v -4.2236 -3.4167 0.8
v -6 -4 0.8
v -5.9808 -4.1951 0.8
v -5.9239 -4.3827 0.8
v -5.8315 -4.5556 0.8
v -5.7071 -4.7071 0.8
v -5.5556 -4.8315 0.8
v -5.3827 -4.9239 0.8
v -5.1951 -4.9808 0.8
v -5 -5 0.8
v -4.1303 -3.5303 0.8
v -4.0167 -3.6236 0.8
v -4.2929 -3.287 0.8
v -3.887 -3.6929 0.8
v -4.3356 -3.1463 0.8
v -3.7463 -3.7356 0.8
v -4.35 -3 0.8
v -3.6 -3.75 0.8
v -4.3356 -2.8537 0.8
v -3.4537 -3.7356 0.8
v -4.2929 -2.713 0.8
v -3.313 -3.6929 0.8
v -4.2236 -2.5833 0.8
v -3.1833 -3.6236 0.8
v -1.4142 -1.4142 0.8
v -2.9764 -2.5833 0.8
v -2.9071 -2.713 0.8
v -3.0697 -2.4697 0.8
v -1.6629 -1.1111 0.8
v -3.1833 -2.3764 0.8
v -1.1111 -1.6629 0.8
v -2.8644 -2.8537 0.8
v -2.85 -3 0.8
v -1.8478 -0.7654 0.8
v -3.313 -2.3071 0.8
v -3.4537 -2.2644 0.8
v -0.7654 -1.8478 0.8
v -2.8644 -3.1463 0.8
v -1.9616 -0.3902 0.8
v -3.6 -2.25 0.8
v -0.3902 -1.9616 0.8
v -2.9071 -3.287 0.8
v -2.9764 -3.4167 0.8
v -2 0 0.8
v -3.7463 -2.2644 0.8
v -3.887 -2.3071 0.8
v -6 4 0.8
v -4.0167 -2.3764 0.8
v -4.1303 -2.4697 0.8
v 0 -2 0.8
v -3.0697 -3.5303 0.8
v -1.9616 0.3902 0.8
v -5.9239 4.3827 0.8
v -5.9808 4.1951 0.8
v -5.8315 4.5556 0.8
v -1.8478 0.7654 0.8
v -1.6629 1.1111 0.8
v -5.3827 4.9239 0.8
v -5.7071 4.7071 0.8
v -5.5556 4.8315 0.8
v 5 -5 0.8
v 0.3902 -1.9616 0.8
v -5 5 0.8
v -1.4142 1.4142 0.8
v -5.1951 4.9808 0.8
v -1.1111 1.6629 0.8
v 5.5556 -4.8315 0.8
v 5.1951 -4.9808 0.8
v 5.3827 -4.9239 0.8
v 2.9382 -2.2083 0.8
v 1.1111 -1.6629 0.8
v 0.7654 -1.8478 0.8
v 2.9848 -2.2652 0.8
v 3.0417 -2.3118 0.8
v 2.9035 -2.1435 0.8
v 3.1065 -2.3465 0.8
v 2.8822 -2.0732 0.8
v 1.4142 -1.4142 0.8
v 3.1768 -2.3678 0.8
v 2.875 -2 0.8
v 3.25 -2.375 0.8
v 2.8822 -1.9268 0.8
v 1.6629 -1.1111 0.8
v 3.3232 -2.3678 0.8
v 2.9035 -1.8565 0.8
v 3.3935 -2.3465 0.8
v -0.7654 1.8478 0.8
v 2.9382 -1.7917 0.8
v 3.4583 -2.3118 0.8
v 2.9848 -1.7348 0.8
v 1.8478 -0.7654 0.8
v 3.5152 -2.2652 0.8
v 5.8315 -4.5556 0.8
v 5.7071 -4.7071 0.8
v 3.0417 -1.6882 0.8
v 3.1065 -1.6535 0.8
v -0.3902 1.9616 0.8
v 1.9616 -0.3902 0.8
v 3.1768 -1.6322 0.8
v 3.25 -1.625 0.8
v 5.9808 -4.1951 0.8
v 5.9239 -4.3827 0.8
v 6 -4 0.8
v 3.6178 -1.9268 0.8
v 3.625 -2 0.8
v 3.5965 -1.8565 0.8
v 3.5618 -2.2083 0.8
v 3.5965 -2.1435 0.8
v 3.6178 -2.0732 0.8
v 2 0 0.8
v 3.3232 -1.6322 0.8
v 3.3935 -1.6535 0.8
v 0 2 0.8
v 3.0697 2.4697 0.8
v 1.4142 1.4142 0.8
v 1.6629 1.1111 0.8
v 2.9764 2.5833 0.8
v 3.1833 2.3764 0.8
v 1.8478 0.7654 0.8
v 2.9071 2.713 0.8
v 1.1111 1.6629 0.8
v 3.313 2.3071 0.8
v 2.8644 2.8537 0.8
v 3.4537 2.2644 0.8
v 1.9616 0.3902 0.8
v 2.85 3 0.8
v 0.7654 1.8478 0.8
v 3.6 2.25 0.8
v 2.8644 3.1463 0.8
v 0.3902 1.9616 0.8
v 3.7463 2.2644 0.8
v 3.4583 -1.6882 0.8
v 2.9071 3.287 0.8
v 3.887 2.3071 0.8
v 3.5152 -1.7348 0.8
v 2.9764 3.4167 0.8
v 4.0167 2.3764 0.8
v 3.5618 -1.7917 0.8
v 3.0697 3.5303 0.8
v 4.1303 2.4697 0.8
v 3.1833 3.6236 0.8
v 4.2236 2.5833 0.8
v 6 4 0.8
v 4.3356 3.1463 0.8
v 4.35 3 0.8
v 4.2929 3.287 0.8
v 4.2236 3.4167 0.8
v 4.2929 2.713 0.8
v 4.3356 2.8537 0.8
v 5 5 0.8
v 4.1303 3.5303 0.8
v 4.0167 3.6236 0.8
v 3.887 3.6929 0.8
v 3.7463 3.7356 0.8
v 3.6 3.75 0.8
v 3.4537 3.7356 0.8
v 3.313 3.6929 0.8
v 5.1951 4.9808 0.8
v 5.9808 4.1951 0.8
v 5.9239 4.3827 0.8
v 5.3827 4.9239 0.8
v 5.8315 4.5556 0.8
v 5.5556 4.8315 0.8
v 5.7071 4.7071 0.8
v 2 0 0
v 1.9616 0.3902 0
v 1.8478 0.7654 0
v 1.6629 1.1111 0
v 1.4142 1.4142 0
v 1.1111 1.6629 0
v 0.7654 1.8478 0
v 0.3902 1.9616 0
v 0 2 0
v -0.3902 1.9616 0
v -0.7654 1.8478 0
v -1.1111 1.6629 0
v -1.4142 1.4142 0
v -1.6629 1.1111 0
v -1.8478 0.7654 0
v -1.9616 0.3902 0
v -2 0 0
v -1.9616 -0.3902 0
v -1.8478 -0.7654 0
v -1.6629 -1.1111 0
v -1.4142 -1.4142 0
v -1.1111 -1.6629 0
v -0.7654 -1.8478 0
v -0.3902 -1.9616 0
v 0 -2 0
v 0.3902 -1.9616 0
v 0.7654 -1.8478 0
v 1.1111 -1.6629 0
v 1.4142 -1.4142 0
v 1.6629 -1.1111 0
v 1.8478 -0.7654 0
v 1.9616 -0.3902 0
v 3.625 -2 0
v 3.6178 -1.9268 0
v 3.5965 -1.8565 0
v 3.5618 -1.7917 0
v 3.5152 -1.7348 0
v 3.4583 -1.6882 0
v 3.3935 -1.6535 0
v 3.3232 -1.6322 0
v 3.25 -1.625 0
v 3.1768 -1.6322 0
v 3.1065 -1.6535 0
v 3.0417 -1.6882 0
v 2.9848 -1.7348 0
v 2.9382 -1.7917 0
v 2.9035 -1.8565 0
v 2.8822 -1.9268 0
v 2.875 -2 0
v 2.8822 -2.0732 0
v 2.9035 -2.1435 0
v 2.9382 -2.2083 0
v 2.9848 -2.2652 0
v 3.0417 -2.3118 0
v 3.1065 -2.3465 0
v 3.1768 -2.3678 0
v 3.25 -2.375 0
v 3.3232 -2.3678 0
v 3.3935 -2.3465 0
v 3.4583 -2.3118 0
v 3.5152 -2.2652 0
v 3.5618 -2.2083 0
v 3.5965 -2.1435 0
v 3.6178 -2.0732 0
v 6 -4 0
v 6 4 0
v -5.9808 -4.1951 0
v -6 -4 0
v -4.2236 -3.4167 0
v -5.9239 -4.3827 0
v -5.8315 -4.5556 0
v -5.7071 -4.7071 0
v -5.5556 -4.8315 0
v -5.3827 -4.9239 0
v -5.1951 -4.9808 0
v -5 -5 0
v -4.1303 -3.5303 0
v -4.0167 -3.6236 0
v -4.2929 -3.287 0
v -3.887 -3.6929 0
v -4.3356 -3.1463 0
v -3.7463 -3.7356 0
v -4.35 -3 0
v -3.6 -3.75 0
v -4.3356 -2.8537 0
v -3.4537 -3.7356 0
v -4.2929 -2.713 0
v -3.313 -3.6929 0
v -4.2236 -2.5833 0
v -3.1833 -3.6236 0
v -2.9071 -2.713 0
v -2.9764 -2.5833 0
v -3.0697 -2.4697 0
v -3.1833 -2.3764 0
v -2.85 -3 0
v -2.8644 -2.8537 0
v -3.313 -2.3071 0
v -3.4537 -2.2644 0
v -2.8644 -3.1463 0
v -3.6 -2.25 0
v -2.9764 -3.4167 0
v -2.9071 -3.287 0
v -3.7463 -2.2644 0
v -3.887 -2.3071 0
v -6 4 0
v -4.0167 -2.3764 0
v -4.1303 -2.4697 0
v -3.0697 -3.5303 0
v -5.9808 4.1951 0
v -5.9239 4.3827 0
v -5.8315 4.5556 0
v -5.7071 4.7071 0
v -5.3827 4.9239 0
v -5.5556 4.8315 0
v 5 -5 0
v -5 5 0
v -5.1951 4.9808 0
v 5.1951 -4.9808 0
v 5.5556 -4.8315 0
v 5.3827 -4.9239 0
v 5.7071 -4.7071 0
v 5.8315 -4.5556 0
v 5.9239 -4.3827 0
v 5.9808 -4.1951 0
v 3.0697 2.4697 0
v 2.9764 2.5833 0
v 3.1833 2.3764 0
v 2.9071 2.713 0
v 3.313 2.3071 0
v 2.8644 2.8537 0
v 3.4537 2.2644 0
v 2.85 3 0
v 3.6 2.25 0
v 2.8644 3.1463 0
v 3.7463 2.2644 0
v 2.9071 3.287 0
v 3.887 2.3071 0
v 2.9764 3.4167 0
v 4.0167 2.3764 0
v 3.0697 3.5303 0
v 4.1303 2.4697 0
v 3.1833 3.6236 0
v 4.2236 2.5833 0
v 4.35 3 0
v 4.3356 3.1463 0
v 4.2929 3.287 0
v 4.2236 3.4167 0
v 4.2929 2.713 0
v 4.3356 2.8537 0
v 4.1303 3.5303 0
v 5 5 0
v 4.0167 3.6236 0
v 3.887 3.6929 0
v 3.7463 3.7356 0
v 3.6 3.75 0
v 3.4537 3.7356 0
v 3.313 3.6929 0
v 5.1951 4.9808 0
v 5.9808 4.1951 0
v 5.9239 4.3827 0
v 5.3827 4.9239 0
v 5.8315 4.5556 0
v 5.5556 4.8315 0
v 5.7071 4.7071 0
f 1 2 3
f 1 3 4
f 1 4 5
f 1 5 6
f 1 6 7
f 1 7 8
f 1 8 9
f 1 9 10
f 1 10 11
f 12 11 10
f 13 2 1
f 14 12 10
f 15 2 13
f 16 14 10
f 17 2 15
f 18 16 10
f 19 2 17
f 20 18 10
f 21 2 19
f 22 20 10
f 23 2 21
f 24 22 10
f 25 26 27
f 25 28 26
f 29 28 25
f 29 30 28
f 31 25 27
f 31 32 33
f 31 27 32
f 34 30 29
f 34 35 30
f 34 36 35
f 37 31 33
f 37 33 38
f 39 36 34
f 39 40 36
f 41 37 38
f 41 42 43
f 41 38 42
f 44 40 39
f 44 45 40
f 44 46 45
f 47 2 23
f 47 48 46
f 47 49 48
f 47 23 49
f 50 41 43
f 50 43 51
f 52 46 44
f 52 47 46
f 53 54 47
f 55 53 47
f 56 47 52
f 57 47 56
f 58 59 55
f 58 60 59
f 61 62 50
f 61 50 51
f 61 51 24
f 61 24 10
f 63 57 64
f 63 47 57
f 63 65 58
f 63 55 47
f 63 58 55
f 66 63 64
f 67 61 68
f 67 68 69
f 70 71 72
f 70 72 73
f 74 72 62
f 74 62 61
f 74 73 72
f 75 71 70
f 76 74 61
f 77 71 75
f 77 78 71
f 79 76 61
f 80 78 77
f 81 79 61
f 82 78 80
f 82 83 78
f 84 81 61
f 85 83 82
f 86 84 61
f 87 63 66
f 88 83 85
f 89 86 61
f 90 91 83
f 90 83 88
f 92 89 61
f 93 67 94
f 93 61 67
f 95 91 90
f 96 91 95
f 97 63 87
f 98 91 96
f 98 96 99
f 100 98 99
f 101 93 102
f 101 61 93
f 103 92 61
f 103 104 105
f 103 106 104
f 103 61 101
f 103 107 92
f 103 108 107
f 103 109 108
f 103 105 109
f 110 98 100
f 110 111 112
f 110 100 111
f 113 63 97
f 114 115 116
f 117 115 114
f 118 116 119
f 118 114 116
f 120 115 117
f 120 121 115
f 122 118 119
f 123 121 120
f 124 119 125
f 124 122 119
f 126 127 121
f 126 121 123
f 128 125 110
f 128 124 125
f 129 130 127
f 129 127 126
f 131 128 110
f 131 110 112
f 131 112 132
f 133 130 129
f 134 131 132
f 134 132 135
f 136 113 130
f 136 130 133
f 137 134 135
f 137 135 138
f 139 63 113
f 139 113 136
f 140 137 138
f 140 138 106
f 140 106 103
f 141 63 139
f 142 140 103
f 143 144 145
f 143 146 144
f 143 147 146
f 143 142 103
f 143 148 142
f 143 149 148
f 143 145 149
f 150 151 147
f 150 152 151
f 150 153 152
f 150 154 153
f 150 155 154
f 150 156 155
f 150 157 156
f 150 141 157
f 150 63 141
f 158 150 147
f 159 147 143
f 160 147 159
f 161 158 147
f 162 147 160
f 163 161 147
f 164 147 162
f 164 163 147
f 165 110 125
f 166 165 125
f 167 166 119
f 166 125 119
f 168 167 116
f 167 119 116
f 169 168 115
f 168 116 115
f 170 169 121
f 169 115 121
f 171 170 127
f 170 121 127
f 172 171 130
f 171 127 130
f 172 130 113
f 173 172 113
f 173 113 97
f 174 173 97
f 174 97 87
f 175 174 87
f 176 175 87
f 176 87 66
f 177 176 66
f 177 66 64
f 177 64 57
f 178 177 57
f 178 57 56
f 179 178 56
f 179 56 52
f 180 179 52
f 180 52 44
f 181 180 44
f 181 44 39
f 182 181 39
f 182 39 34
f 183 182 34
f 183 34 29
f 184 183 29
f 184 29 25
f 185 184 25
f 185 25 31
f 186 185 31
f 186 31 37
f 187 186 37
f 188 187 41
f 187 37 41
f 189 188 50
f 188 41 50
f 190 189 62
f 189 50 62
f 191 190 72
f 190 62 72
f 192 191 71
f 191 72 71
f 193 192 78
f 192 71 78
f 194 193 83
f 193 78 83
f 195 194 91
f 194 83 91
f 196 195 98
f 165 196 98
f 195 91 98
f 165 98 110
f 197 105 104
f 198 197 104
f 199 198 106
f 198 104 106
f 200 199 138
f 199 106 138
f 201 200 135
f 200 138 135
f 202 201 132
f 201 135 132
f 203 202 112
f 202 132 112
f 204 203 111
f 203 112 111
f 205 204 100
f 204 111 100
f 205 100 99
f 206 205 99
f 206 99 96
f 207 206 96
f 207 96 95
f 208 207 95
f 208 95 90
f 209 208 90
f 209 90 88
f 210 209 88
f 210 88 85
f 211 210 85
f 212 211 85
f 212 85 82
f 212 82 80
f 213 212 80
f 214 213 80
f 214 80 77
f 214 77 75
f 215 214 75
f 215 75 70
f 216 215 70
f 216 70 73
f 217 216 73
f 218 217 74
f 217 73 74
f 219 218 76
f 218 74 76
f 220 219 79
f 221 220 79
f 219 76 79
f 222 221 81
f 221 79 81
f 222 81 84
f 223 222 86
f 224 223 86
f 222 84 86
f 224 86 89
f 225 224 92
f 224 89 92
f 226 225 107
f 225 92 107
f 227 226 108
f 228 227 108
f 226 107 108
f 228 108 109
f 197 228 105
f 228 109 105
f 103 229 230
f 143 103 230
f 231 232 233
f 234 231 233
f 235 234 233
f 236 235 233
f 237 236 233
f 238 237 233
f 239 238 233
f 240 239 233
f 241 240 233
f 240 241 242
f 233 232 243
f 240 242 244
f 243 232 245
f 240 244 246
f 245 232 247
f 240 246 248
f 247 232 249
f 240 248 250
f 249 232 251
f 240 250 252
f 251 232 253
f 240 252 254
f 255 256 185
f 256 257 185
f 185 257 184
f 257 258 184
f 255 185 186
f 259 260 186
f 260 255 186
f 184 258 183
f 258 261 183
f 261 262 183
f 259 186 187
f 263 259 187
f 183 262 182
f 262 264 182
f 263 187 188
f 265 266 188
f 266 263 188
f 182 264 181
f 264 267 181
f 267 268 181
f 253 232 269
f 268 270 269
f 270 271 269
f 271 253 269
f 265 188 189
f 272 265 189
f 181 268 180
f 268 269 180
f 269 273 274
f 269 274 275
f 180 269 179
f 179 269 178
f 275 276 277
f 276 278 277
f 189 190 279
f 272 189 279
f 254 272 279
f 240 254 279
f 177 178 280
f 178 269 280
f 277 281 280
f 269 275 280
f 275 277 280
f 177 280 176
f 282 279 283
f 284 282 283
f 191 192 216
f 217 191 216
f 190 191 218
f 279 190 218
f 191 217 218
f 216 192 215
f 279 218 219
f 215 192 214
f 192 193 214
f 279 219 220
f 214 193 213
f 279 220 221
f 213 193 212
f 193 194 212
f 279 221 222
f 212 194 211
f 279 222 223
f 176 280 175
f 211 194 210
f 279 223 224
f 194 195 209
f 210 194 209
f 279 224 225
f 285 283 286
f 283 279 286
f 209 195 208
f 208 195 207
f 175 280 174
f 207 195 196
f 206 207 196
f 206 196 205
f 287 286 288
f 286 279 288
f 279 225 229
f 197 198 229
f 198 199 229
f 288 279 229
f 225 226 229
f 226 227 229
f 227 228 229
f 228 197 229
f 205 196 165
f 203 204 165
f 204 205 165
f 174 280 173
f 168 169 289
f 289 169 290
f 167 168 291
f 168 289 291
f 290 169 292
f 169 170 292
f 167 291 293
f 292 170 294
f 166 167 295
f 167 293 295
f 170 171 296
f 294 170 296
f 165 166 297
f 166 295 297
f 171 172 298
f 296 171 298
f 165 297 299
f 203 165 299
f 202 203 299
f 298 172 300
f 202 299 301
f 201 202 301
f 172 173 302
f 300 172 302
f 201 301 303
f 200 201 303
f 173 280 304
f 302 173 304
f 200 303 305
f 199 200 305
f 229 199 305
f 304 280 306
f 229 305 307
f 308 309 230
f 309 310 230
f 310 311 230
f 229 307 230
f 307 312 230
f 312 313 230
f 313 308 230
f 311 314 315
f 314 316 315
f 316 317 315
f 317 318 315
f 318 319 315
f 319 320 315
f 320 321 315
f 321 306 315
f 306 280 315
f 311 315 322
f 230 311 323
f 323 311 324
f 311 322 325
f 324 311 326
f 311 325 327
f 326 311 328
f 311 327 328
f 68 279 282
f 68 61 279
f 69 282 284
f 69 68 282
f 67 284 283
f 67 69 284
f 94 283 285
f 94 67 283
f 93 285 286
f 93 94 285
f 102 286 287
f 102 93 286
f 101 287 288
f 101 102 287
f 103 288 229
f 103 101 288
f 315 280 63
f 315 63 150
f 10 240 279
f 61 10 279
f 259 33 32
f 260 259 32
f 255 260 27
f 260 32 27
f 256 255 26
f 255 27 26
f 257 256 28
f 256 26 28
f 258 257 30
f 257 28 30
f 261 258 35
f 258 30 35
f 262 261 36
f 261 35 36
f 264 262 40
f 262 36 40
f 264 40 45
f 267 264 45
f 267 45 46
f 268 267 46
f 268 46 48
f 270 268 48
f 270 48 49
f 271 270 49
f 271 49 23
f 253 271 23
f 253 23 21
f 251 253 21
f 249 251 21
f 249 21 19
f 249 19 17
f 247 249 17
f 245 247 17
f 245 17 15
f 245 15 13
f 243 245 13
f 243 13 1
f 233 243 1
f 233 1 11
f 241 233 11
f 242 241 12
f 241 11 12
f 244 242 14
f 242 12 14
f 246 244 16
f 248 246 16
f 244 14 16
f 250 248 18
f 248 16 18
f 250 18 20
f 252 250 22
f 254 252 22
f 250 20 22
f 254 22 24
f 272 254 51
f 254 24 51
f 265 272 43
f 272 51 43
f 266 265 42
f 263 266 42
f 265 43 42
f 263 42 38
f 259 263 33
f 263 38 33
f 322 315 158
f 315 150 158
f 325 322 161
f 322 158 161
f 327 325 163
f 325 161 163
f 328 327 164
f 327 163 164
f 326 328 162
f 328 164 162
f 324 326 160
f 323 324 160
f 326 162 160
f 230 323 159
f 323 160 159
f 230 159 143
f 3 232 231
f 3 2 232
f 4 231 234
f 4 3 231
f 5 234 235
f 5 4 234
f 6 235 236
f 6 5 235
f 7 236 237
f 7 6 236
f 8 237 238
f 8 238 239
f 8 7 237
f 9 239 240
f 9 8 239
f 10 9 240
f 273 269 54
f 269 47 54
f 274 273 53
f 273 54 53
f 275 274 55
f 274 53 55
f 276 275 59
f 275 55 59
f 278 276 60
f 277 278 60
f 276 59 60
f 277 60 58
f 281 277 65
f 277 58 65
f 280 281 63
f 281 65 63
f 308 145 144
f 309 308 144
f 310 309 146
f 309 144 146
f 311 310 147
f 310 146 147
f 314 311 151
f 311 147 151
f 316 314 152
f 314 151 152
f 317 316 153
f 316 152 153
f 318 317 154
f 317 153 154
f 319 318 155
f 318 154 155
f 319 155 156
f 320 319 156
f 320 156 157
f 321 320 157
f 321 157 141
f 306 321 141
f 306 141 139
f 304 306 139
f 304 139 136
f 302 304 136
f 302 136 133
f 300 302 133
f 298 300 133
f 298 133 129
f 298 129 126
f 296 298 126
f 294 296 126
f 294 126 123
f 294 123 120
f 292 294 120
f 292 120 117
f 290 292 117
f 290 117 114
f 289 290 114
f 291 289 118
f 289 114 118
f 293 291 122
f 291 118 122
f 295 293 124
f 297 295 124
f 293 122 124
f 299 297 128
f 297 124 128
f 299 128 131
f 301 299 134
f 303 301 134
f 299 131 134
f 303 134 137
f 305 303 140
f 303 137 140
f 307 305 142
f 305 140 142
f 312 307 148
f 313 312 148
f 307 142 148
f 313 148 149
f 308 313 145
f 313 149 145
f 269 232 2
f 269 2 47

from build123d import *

# Parameters (mm, degrees)
SKETCH_1_W          = 12
SKETCH_1_H          = 10
EXTRUDE_1_DEPTH     = 0.8
CUT_EXTRUDE_1_REACH = 9.851
SKETCH_2_R          = 2
SKETCH_2_R_2        = 0.75
SKETCH_2_R_3        = 0.375
FILLET_1_R          = 1


with BuildPart() as part:
    # Эскиз1 → Бобышка-Вытянуть1 (new body)
    with BuildSketch(Plane.XY):
        Rectangle(SKETCH_1_W, SKETCH_1_H)
    extrude(amount=EXTRUDE_1_DEPTH)

    # Эскиз2 → Вырез-Вытянуть1 (cut, up to next)
    with BuildSketch(Plane.XY.offset(0.8), mode=Mode.PRIVATE) as cut_extrude_1_sk1:
        Circle(SKETCH_2_R)
    cut_extrude_1_tool1 = extrude(cut_extrude_1_sk1.sketch, amount=-CUT_EXTRUDE_1_REACH, mode=Mode.PRIVATE) & part.part
    # Эскиз2 → Вырез-Вытянуть1 (cut, up to next)
    with BuildSketch(Plane.XY.offset(0.8), mode=Mode.PRIVATE) as cut_extrude_1_sk2:
        with Locations((-3.6, -3)):
            Circle(SKETCH_2_R_2)
    cut_extrude_1_tool2 = extrude(cut_extrude_1_sk2.sketch, amount=-CUT_EXTRUDE_1_REACH, mode=Mode.PRIVATE) & part.part
    # Эскиз2 → Вырез-Вытянуть1 (cut, up to next)
    with BuildSketch(Plane.XY.offset(0.8), mode=Mode.PRIVATE) as cut_extrude_1_sk3:
        with Locations((3.6, 3)):
            Circle(SKETCH_2_R_2)
    cut_extrude_1_tool3 = extrude(cut_extrude_1_sk3.sketch, amount=-CUT_EXTRUDE_1_REACH, mode=Mode.PRIVATE) & part.part
    # Эскиз2 → Вырез-Вытянуть1 (cut, up to next)
    with BuildSketch(Plane.XY.offset(0.8), mode=Mode.PRIVATE) as cut_extrude_1_sk4:
        with Locations((3.25, -2)):
            Circle(SKETCH_2_R_3)
    cut_extrude_1_tool4 = extrude(cut_extrude_1_sk4.sketch, amount=-CUT_EXTRUDE_1_REACH, mode=Mode.PRIVATE) & part.part
    add(cut_extrude_1_tool1.solids().sort_by_distance((0, 0, 0.8))[0], mode=Mode.SUBTRACT)
    add(cut_extrude_1_tool2.solids().sort_by_distance((-3.6, -3, 0.8))[0], mode=Mode.SUBTRACT)
    add(cut_extrude_1_tool3.solids().sort_by_distance((3.6, 3, 0.8))[0], mode=Mode.SUBTRACT)
    add(cut_extrude_1_tool4.solids().sort_by_distance((3.25, -2, 0.8))[0], mode=Mode.SUBTRACT)

    # Скругление1
    fillet_1_edges = [part.edges().sort_by_distance(p)[0] for p in [
        (6, -5, 0.4),
        (-6, -5, 0.4),
        (-6, 5, 0.4),
        (6, 5, 0.4),
    ]]
    fillet(fillet_1_edges, radius=FILLET_1_R)


solid = part.part
